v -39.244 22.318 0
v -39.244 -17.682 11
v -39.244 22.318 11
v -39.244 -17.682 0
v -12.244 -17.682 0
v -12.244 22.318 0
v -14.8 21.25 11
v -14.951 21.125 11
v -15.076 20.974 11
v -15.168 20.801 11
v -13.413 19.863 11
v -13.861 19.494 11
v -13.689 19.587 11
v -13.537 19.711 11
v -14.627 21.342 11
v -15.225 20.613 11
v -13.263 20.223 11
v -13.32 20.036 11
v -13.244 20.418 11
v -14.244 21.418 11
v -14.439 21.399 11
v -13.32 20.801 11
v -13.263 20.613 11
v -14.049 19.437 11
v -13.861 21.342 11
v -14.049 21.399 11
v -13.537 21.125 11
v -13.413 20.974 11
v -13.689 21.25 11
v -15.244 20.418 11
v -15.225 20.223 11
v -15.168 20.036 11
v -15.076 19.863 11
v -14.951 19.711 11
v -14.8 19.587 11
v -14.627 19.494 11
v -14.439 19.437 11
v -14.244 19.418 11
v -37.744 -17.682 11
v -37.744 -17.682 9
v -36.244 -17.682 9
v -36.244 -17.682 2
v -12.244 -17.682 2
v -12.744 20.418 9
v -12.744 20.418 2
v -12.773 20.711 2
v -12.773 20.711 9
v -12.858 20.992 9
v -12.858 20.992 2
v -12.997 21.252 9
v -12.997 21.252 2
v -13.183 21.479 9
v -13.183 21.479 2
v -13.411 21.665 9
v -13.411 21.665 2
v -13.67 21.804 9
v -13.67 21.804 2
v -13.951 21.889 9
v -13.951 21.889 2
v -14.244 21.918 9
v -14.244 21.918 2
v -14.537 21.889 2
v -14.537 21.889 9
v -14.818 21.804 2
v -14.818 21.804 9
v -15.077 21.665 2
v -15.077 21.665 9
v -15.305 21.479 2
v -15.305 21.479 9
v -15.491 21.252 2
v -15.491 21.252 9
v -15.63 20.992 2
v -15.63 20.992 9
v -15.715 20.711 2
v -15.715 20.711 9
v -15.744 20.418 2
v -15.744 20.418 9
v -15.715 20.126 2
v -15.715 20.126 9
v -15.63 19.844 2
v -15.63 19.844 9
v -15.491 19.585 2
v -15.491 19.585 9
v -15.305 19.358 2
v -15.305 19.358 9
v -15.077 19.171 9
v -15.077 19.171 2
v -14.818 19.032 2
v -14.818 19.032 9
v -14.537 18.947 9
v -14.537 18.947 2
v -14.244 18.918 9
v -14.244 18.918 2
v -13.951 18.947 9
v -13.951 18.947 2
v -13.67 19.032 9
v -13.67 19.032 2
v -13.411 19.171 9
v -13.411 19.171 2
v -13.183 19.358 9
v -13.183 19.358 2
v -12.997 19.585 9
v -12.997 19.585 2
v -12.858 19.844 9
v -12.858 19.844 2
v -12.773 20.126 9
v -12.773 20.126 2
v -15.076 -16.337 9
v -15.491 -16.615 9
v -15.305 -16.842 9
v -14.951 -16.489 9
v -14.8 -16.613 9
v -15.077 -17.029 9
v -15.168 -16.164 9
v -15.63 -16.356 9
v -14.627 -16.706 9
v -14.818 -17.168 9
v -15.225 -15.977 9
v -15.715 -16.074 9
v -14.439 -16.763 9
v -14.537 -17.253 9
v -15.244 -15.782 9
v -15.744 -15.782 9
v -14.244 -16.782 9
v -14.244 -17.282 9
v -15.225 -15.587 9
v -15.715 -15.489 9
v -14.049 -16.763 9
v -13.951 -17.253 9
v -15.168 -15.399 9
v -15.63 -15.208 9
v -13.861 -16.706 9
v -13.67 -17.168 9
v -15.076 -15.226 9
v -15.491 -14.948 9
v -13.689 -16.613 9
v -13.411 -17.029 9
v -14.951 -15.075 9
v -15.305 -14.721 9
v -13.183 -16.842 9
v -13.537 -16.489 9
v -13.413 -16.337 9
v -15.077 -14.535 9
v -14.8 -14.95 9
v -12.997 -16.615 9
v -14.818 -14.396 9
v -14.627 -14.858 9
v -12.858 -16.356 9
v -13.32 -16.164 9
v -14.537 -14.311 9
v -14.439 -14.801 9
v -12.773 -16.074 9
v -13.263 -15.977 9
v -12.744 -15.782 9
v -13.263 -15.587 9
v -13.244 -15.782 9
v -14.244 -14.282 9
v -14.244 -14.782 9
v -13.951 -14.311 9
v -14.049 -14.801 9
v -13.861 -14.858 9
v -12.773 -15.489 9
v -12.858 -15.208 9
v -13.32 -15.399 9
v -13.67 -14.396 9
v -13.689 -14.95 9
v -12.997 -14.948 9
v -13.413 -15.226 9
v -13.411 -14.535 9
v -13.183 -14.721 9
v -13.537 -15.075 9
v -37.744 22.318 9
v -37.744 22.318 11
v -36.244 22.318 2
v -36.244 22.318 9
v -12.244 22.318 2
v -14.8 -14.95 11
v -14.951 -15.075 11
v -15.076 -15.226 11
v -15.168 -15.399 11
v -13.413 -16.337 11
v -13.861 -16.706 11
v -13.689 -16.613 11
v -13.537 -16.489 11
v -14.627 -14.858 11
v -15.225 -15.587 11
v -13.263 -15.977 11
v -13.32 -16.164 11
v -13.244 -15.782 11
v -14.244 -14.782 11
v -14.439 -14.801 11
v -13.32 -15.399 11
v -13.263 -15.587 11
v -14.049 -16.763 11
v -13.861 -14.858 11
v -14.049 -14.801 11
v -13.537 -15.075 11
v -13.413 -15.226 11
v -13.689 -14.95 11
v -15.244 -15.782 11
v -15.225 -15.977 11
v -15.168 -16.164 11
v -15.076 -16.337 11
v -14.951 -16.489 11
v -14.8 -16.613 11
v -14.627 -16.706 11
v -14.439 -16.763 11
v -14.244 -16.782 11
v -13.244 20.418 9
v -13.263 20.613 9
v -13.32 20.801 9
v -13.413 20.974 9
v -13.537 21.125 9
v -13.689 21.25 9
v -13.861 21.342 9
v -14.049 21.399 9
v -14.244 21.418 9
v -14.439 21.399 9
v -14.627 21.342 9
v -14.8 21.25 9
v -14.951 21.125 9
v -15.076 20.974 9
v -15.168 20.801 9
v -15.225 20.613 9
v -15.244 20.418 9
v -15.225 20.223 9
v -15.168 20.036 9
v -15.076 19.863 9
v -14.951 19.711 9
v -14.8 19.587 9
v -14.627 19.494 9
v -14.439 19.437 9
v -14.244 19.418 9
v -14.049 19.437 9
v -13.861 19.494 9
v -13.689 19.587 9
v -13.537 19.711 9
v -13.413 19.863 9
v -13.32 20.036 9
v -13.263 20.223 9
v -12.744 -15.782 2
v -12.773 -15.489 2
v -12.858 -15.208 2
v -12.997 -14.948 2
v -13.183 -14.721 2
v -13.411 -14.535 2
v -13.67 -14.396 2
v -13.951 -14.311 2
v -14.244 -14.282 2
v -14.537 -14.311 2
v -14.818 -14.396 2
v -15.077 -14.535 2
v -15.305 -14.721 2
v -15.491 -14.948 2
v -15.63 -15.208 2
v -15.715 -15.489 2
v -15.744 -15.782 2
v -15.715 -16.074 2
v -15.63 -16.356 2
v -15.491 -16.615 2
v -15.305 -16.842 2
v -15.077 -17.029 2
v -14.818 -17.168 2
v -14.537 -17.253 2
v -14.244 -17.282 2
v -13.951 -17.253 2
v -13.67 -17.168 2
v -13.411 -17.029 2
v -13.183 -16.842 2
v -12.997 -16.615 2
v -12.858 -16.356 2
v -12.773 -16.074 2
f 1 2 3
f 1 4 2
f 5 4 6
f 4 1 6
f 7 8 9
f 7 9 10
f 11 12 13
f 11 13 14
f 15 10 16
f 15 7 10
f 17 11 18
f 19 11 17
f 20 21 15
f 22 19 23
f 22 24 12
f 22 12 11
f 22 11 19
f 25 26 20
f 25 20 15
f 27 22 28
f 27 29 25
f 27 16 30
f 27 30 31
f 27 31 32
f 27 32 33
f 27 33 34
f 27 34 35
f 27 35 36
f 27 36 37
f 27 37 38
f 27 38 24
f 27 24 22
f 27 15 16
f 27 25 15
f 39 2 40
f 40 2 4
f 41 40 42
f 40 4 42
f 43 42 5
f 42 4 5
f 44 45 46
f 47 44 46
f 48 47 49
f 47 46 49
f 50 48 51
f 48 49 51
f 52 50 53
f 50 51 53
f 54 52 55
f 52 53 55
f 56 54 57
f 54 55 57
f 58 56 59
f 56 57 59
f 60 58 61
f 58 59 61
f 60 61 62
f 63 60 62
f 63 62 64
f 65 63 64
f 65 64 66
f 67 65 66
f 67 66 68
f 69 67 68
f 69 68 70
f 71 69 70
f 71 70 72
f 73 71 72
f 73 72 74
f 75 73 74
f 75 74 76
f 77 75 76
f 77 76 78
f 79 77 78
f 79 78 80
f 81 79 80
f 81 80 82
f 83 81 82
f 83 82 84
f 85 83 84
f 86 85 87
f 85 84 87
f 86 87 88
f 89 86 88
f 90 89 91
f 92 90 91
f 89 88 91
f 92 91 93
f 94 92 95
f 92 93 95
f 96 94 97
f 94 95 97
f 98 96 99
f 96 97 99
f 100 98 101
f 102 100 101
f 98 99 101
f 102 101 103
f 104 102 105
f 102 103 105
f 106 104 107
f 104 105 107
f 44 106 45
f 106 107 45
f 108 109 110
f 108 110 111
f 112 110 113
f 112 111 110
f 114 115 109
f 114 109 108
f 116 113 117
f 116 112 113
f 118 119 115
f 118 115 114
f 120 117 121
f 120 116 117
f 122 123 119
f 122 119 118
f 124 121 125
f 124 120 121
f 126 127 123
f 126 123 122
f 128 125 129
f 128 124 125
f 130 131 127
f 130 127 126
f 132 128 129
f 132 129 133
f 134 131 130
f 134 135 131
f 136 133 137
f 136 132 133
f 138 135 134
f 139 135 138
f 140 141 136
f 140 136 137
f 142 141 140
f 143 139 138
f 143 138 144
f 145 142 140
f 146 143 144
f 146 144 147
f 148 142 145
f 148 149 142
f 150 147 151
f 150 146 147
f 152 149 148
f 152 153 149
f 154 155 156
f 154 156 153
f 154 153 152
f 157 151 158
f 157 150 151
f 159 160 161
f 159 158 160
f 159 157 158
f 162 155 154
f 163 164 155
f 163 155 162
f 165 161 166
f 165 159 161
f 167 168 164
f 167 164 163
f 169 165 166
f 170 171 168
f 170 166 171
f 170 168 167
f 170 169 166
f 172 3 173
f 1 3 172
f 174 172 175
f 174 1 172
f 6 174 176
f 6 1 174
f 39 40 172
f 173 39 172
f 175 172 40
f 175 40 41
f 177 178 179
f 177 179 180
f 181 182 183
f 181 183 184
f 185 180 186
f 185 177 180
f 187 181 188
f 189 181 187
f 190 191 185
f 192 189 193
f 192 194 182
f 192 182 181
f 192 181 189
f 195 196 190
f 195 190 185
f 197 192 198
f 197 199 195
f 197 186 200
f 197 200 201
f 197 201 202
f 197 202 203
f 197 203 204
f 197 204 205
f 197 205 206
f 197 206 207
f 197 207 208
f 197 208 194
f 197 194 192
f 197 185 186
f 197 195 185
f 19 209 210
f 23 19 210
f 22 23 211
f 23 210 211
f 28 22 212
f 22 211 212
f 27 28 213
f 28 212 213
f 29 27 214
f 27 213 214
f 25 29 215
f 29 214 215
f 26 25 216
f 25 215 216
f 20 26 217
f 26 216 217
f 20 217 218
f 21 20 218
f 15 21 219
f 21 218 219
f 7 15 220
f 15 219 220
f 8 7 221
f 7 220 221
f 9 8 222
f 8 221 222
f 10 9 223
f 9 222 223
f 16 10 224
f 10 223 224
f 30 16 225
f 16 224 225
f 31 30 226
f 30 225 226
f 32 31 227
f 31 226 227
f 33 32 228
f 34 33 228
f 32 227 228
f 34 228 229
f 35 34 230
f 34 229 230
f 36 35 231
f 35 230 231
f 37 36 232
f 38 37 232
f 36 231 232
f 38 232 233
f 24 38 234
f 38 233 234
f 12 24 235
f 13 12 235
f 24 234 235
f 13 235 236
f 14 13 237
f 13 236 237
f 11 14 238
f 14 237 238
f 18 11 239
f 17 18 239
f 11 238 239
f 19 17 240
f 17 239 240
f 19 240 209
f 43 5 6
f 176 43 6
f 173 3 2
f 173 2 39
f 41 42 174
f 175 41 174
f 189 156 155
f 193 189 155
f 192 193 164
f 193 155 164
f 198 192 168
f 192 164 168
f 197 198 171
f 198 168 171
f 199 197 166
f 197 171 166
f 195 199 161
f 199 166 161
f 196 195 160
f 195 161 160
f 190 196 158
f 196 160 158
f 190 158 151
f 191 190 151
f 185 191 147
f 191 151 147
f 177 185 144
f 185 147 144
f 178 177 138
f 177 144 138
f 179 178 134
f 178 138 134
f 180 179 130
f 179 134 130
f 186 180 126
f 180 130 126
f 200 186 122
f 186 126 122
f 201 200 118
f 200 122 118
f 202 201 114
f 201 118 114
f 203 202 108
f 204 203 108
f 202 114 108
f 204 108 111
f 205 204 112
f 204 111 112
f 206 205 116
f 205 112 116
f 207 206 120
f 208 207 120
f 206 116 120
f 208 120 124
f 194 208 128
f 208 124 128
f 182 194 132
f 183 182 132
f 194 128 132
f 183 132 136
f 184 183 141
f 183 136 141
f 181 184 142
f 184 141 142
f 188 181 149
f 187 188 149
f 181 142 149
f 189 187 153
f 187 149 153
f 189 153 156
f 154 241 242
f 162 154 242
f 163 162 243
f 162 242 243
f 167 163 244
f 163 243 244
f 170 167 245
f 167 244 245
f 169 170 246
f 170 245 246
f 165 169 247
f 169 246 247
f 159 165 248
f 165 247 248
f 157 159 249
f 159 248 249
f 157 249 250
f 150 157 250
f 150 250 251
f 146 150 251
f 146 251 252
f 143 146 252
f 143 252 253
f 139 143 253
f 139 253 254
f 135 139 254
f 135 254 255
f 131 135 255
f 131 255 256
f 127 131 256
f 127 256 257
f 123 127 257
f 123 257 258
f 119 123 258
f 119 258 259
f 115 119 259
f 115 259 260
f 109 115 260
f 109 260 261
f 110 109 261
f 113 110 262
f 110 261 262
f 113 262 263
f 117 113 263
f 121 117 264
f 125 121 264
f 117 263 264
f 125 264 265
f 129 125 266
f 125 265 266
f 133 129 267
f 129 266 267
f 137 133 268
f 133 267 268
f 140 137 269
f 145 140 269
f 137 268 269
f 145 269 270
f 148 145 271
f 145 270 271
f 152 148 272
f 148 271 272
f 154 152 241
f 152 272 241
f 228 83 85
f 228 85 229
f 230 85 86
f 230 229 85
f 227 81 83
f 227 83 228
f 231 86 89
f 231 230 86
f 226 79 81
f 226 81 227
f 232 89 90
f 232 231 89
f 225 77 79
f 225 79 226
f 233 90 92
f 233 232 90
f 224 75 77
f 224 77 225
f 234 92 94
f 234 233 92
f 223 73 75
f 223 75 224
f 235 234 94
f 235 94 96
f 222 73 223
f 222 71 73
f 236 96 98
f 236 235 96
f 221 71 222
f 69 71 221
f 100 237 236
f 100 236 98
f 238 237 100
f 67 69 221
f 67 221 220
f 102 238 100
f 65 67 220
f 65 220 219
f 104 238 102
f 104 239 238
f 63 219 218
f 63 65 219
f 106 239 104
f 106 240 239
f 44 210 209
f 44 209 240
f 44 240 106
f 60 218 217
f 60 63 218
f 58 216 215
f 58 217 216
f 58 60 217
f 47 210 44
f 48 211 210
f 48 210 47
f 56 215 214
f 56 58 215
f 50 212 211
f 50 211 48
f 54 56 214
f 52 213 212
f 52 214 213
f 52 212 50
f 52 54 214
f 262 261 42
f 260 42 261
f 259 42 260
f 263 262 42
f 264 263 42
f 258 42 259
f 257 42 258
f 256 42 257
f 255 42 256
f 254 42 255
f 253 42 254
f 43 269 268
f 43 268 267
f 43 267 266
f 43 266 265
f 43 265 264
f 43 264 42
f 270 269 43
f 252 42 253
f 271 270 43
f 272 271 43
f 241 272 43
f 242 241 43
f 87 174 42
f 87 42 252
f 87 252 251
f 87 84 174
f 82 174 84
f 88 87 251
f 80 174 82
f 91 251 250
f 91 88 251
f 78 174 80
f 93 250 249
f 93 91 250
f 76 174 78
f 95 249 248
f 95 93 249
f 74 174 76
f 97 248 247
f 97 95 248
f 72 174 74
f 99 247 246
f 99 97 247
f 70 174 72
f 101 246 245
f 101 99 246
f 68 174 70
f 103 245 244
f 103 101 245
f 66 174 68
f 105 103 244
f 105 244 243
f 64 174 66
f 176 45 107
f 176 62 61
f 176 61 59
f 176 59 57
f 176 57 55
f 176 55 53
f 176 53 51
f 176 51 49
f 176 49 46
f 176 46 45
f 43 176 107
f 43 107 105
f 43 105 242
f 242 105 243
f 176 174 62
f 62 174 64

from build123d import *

# Parameters (mm, degrees)
F0_W     = 24
F0_H     = 40
F0_R     = 1.5
F0_W_2   = 3
F1_DEPTH = 2
F2_DEPTH = 9
F3_DEPTH = 9
F4_W     = 1.5
F4_H     = 40
F4_R     = 1
F5_DEPTH = 2


with BuildPart() as f1:
    # F0 (on Top) → F1 (new body)
    with BuildSketch(Plane.XY):
        with Locations((-24.2441255752, 2.3181930908)):
            Rectangle(F0_W, F0_H)
        with Locations((-14.2441255752, -15.7818069092)):
            Circle(F0_R, mode=Mode.SUBTRACT)
        with Locations((-14.2441255752, 20.4181930908)):
            Circle(F0_R, mode=Mode.SUBTRACT)
        with Locations((-37.7441255752, 2.3181930908)):
            Rectangle(F0_W_2, F0_H)
        with Locations((-14.2441255752, 20.4181930908)):
            Circle(F0_R)
        with Locations((-14.2441255752, -15.7818069092)):
            Circle(F0_R)
    extrude(amount=F1_DEPTH)

    # F0 (on Top) → F2 (join)
    with BuildSketch(Plane.XY):
        with Locations((-37.7441255752, 2.3181930908)):
            Rectangle(F0_W_2, F0_H)
    extrude(amount=F2_DEPTH)

    # F0 (on Top) → F3 (join, through all)
    with BuildSketch(Plane.XY):
        with Locations((-14.2441255752, 20.4181930908)):
            Circle(F0_R)
        with Locations((-14.2441255752, -15.7818069092)):
            Circle(F0_R)
    extrude(amount=F3_DEPTH)

    # F4 (on face) → F5 (join)
    with BuildSketch(Plane.XY.offset(9)):
        with Locations((-38.4941255752, 2.3181930908)):
            Rectangle(F4_W, F4_H)
        with Locations((-14.2441255752, 20.4181930908)):
            Circle(F4_R)
        with Locations((-14.2441255752, -15.7818069092)):
            Circle(F4_R)
    extrude(amount=F5_DEPTH)


solid = f1.part
